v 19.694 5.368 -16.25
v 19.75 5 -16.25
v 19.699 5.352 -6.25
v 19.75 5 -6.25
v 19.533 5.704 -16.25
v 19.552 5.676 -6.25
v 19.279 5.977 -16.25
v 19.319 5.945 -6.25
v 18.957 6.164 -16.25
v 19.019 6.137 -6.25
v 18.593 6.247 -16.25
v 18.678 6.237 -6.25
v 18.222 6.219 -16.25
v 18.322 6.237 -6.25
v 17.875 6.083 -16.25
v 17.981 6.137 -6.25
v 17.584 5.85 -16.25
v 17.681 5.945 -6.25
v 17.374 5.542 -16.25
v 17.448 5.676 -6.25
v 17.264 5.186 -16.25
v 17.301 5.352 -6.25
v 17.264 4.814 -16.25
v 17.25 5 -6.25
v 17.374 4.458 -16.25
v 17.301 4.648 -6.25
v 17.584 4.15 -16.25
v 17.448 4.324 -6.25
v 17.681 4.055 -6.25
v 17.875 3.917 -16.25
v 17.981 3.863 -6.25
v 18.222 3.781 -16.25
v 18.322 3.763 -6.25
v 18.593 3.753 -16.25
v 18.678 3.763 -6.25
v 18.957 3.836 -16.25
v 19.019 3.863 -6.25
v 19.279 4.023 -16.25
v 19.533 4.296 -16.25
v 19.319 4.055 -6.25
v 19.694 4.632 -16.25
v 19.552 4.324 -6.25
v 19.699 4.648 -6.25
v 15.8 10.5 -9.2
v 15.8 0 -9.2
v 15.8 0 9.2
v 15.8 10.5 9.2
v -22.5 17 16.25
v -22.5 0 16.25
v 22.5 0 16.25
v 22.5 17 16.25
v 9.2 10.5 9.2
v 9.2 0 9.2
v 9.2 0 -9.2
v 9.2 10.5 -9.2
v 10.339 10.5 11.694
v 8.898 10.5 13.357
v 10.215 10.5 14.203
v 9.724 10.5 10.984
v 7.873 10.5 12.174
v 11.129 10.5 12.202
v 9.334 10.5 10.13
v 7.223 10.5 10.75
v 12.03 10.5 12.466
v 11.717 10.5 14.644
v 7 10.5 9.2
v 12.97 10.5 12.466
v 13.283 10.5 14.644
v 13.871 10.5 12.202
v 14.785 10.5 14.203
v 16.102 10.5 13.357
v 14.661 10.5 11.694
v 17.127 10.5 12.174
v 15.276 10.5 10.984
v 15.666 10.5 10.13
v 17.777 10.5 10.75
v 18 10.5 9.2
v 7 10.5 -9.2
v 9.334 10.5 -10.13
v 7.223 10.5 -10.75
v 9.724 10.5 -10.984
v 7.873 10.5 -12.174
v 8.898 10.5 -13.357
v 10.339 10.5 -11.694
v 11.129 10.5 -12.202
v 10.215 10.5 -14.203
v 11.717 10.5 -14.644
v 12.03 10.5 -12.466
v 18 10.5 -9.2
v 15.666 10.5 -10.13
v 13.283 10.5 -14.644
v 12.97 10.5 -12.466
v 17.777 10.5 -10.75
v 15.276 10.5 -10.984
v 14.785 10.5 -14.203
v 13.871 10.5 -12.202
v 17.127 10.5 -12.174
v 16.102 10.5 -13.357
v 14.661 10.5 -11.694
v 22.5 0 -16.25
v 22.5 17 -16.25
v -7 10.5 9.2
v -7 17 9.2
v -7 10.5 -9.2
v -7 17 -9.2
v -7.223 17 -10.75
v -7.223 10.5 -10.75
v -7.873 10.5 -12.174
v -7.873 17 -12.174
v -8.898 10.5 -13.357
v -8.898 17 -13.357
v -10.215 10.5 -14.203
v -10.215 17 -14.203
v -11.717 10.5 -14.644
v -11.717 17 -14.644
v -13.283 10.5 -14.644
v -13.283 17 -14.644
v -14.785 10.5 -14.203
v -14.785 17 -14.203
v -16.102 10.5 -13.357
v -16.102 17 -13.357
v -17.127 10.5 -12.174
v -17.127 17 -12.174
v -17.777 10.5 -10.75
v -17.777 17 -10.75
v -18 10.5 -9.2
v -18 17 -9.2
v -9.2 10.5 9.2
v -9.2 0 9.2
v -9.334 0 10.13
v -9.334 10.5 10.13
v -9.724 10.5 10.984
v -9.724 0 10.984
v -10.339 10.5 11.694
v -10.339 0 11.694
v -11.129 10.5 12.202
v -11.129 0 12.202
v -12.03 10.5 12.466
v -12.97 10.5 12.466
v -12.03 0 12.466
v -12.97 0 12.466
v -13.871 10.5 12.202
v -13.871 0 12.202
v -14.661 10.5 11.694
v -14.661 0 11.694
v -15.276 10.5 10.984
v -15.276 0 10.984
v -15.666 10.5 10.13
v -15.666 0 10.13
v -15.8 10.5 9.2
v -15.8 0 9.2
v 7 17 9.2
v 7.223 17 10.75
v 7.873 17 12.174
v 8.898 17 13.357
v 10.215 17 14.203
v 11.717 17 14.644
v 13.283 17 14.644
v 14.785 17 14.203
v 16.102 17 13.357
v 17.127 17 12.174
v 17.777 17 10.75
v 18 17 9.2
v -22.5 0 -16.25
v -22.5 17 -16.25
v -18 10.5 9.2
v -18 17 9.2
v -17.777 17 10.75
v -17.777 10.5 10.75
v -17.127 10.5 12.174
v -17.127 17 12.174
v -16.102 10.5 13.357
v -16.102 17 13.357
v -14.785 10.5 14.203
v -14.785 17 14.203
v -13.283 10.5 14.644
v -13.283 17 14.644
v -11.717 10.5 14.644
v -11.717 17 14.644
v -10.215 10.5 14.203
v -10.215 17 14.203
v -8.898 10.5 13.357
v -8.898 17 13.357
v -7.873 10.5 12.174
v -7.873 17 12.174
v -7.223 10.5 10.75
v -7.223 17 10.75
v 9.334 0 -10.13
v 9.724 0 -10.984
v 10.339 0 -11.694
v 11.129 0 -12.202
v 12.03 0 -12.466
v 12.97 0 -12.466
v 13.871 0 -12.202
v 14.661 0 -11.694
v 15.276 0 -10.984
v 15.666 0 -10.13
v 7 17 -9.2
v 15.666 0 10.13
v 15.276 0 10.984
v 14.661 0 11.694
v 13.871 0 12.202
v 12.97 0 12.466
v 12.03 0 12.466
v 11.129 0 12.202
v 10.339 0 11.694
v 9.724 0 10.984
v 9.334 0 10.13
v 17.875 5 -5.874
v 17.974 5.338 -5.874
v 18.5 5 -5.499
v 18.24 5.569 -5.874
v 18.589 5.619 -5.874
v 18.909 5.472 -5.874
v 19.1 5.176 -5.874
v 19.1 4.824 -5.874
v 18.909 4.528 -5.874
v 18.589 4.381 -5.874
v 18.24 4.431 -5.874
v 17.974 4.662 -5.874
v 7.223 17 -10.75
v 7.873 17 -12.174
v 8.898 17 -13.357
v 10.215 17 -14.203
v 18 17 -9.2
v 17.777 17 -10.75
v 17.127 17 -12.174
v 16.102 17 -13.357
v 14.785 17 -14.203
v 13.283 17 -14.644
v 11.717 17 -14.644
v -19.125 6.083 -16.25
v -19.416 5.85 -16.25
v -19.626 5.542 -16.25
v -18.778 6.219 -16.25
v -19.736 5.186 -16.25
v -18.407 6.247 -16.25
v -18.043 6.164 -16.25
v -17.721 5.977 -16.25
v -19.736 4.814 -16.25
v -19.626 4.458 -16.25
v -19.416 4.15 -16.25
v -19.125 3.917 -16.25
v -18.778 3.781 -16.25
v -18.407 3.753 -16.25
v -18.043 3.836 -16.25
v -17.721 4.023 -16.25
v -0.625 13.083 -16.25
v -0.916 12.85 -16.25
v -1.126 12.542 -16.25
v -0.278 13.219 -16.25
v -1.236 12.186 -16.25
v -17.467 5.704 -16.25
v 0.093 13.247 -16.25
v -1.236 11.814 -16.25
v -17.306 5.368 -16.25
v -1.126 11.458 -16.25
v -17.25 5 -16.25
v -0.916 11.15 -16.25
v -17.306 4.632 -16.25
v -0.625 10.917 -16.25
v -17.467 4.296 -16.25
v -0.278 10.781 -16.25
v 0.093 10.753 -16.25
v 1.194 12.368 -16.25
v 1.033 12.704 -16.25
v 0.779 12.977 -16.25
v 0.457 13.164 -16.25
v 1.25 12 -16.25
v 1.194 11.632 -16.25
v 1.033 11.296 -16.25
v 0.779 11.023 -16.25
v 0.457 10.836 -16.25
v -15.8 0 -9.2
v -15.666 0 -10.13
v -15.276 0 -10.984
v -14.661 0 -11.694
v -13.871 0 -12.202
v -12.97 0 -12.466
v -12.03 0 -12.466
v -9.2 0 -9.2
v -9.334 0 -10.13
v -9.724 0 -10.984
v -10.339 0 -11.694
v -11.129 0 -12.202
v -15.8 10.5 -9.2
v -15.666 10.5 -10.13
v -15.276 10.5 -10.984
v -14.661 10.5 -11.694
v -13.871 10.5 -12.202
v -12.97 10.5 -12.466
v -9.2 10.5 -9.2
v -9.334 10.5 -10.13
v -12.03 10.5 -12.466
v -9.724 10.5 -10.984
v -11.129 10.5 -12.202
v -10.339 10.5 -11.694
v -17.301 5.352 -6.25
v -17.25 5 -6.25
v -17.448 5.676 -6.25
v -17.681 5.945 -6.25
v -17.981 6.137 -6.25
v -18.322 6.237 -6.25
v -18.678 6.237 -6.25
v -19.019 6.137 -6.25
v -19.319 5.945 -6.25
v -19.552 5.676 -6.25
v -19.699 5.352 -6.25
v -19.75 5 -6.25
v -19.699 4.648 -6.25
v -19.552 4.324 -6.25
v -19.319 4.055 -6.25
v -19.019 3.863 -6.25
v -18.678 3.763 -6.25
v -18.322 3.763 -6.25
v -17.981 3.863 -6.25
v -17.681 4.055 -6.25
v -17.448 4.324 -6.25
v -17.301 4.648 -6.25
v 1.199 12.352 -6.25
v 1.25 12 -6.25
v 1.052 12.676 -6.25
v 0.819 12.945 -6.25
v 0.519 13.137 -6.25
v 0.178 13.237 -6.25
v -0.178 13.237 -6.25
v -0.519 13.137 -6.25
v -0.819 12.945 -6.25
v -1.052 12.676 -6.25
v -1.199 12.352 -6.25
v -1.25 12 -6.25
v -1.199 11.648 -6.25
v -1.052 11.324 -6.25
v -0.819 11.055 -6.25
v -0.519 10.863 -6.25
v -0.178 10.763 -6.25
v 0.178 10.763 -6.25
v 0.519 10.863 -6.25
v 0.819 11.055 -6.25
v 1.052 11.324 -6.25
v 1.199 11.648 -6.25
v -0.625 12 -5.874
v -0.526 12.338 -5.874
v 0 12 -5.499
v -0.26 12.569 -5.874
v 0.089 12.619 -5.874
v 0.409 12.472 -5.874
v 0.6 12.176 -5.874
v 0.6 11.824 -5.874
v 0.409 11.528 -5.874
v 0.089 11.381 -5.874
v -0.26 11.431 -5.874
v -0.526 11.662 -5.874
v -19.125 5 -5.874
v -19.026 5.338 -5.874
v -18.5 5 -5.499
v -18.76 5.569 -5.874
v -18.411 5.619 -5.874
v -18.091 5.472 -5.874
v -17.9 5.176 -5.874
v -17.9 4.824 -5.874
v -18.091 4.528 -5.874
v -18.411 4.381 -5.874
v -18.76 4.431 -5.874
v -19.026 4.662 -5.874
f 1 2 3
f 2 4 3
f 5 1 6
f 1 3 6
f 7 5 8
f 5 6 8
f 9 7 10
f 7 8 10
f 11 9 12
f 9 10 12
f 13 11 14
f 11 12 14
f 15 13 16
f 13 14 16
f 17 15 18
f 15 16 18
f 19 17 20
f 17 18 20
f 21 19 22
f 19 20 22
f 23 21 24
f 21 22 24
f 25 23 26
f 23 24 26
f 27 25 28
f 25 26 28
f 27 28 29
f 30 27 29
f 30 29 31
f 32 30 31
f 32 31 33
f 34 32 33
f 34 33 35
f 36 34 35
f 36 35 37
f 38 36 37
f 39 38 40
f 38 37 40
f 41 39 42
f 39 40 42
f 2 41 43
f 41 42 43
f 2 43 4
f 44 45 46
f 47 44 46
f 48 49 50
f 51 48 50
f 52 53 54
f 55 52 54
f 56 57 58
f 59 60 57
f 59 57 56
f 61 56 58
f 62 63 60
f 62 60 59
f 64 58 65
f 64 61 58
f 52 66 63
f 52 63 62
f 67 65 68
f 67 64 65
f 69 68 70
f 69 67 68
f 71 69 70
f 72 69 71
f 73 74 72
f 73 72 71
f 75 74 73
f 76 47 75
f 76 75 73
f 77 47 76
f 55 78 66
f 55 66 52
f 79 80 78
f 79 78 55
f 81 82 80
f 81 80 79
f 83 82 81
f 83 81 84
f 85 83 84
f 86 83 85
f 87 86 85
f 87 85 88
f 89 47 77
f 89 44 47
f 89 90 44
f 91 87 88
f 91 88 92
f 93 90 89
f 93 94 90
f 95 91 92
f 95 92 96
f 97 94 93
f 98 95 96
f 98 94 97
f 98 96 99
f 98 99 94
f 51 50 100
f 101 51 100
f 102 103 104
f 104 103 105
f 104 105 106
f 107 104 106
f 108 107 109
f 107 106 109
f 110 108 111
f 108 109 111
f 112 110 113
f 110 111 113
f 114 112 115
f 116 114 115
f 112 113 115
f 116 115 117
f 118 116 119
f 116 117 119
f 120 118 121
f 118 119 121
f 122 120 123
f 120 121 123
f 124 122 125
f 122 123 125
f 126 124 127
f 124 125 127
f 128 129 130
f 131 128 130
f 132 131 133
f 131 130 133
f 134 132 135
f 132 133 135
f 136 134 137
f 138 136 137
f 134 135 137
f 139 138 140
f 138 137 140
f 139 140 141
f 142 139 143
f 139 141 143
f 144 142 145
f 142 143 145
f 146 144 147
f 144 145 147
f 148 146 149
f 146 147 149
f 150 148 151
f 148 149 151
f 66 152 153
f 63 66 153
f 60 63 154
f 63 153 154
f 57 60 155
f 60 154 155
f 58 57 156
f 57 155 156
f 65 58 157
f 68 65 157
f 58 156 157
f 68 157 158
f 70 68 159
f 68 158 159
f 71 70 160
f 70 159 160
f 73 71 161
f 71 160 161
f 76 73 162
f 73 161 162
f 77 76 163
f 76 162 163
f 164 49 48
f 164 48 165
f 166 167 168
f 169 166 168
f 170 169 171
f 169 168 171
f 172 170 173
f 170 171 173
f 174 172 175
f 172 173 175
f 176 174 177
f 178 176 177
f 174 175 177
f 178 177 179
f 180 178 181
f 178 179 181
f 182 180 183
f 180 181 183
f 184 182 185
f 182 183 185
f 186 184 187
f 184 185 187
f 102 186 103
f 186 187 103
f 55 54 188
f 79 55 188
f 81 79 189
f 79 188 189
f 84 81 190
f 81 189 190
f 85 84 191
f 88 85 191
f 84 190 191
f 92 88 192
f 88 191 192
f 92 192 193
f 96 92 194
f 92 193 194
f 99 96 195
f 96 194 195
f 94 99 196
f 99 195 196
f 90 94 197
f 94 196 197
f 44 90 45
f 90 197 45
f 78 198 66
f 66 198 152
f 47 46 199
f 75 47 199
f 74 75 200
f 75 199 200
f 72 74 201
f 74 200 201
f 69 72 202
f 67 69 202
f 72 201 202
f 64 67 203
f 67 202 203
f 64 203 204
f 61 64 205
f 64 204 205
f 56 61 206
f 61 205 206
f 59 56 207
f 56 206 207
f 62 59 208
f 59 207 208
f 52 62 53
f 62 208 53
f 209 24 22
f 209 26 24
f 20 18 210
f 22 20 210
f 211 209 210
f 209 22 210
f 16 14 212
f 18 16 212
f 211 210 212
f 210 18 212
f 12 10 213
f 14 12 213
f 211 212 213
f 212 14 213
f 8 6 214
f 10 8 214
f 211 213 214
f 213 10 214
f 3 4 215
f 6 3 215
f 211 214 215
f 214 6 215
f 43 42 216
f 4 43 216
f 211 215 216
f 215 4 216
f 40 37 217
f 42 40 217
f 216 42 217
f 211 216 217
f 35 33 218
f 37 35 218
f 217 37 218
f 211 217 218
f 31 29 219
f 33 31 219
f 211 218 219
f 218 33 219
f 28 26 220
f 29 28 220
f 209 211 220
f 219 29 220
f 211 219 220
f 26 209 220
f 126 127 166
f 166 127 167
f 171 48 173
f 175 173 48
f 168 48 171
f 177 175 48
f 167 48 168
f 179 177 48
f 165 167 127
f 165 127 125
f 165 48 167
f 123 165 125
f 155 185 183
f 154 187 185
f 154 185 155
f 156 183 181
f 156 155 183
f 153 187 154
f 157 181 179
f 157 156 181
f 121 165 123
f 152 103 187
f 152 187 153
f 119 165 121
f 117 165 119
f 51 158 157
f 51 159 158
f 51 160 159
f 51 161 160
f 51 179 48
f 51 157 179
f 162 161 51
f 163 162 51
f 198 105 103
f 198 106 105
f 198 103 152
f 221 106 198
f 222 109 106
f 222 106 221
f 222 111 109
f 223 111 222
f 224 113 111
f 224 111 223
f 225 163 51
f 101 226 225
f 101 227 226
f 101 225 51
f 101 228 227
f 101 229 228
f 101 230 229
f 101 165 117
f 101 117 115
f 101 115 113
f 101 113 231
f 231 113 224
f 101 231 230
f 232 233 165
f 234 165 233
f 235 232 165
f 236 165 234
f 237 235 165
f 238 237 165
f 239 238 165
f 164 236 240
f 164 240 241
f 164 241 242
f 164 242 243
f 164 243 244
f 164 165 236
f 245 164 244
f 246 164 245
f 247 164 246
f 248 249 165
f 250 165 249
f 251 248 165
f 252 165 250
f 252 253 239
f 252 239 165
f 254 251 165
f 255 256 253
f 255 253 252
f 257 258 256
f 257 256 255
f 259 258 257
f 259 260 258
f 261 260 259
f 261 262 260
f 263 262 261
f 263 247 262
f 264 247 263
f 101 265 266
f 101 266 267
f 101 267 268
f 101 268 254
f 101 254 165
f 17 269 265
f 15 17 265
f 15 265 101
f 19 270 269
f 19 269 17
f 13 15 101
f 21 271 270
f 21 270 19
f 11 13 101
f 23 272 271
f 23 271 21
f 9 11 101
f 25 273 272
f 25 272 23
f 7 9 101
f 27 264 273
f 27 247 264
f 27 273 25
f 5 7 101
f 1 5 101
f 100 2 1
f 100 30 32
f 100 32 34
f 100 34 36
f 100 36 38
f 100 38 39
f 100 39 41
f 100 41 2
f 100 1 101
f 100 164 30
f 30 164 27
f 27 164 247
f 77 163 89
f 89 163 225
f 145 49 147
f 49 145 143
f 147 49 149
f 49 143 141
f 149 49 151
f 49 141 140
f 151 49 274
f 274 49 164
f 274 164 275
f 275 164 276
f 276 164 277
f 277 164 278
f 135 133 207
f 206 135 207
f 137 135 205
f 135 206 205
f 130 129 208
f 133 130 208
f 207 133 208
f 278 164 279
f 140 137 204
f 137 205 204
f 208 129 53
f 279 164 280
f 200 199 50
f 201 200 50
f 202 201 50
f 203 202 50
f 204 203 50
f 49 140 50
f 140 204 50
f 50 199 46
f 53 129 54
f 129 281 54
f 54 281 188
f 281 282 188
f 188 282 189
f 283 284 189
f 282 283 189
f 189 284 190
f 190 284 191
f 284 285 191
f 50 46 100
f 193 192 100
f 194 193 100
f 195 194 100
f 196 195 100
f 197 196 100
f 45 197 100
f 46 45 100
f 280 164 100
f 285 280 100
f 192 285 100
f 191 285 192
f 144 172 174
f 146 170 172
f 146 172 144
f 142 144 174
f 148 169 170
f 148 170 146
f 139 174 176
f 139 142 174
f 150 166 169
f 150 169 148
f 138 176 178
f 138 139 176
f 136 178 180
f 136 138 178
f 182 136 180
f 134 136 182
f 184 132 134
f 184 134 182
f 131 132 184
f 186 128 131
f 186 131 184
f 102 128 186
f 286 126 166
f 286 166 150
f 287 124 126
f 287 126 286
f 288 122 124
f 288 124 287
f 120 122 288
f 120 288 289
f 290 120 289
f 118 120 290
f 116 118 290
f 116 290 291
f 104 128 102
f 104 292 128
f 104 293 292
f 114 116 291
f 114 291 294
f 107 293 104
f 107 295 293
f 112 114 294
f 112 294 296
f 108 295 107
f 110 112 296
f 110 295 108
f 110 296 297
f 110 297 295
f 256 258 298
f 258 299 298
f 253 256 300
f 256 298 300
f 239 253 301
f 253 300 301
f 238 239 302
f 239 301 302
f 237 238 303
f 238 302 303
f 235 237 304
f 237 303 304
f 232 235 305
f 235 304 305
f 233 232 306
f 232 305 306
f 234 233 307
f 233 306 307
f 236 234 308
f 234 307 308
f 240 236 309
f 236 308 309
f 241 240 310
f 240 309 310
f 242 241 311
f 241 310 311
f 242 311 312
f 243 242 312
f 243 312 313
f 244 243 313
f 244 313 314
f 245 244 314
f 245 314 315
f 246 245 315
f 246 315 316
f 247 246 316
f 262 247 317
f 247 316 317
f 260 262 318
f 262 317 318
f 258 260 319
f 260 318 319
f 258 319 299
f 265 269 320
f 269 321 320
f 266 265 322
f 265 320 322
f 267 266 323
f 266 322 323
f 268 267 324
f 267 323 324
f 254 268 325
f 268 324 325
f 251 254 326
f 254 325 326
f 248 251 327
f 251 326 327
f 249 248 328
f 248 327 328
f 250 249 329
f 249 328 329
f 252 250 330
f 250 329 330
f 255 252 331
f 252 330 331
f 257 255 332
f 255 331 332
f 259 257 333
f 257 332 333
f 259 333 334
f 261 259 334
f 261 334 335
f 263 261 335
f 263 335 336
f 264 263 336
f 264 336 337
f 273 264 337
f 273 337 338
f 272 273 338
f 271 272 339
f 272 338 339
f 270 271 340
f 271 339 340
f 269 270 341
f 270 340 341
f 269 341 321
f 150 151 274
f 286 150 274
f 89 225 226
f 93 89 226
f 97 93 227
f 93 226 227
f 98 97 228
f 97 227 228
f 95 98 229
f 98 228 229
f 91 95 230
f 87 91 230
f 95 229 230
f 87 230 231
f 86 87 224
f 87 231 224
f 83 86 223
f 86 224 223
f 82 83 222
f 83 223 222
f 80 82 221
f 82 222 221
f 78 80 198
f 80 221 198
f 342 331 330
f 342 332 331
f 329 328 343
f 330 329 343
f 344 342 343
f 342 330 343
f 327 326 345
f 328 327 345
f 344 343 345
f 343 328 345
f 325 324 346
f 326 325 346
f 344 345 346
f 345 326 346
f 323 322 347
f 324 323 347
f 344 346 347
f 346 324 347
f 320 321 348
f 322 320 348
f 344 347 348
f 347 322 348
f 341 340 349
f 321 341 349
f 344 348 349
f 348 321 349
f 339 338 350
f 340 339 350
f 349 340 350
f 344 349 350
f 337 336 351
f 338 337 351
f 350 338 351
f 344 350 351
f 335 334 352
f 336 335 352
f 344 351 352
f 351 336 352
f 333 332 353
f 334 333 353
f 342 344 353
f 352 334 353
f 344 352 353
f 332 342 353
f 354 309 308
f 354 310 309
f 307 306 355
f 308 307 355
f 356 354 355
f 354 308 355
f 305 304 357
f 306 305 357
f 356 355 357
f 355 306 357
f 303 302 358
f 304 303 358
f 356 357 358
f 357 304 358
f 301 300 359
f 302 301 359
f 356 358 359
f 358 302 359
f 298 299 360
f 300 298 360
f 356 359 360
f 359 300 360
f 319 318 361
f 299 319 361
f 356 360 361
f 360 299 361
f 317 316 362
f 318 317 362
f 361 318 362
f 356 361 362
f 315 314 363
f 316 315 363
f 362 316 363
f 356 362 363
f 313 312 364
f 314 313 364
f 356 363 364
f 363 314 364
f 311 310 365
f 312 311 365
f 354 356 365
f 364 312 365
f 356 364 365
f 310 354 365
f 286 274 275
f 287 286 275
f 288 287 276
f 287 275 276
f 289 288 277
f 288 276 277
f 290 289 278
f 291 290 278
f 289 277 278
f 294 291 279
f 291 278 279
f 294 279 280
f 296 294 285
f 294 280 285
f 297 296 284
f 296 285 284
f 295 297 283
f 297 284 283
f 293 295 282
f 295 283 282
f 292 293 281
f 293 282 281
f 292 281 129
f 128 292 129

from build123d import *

# Parameters (mm, degrees)
SKETCH1_W             = 45
SKETCH1_H             = 32.5
BOSS_EXTRUDE1_DEPTH   = 17
CUT_EXTRUDE1_DEPTH    = 6.5
M3_TAPPED_HOLE1_D     = 2.5
M3_TAPPED_HOLE1_DEPTH = 10
M3_TAPPED_HOLE1_TIP   = 0.751075774


with BuildPart() as part:
    # Sketch1 → Boss-Extrude1 (new body)
    with BuildSketch(Plane(origin=(0, 0, 0), x_dir=(1, 0, 0), z_dir=(0, 1, 0))):
        Rectangle(SKETCH1_W, SKETCH1_H)
        with BuildLine():
            Line((-15.8, -9.2), (-15.8, 9.2))
            ThreePointArc((-15.8, 9.2), (-12.5, 12.5), (-9.2, 9.2))
            Line((-9.2, 9.2), (-9.2, -9.2))
            ThreePointArc((-9.2, -9.2), (-12.5, -12.5), (-15.8, -9.2))
        make_face(mode=Mode.SUBTRACT)
        with BuildLine():
            Line((9.2, -9.2), (9.2, 9.2))
            ThreePointArc((9.2, 9.2), (12.5, 12.5), (15.8, 9.2))
            Line((15.8, 9.2), (15.8, -9.2))
            ThreePointArc((15.8, -9.2), (12.5, -12.5), (9.2, -9.2))
        make_face(mode=Mode.SUBTRACT)
    extrude(amount=BOSS_EXTRUDE1_DEPTH)

    # Sketch2 → Cut-Extrude1 (cut)
    with BuildSketch(Plane(origin=(0, 17, 0), x_dir=(1, 0, 0), z_dir=(0, 1, 0))):
        with BuildLine():
            Line((18, -9.2), (18, 9.2))
            ThreePointArc((18, 9.2), (12.5, 14.7), (7, 9.2))
            Line((7, 9.2), (7, -9.2))
            ThreePointArc((7, -9.2), (12.5, -14.7), (18, -9.2))
        make_face()
        with BuildLine():
            Line((-7, -9.2), (-7, 9.2))
            ThreePointArc((-7, 9.2), (-12.5, 14.7), (-18, 9.2))
            Line((-18, 9.2), (-18, -9.2))
            ThreePointArc((-18, -9.2), (-12.5, -14.7), (-7, -9.2))
        make_face()
    extrude(amount=-CUT_EXTRUDE1_DEPTH, mode=Mode.SUBTRACT)

    # M3 Tapped Hole1
    with Locations(Plane(origin=(0, 0, -16.25), x_dir=(-1, 0, 0), z_dir=(0, 0, -1))):
        with Locations((-18.5, 5), (0, 12), (18.5, 5)):
            Hole(M3_TAPPED_HOLE1_D / 2, depth=M3_TAPPED_HOLE1_DEPTH)
            with Locations((0, 0, -(M3_TAPPED_HOLE1_DEPTH + M3_TAPPED_HOLE1_TIP / 2))):  # 118° drill point
                Cone(0, M3_TAPPED_HOLE1_D / 2, M3_TAPPED_HOLE1_TIP, mode=Mode.SUBTRACT)


solid = part.part
